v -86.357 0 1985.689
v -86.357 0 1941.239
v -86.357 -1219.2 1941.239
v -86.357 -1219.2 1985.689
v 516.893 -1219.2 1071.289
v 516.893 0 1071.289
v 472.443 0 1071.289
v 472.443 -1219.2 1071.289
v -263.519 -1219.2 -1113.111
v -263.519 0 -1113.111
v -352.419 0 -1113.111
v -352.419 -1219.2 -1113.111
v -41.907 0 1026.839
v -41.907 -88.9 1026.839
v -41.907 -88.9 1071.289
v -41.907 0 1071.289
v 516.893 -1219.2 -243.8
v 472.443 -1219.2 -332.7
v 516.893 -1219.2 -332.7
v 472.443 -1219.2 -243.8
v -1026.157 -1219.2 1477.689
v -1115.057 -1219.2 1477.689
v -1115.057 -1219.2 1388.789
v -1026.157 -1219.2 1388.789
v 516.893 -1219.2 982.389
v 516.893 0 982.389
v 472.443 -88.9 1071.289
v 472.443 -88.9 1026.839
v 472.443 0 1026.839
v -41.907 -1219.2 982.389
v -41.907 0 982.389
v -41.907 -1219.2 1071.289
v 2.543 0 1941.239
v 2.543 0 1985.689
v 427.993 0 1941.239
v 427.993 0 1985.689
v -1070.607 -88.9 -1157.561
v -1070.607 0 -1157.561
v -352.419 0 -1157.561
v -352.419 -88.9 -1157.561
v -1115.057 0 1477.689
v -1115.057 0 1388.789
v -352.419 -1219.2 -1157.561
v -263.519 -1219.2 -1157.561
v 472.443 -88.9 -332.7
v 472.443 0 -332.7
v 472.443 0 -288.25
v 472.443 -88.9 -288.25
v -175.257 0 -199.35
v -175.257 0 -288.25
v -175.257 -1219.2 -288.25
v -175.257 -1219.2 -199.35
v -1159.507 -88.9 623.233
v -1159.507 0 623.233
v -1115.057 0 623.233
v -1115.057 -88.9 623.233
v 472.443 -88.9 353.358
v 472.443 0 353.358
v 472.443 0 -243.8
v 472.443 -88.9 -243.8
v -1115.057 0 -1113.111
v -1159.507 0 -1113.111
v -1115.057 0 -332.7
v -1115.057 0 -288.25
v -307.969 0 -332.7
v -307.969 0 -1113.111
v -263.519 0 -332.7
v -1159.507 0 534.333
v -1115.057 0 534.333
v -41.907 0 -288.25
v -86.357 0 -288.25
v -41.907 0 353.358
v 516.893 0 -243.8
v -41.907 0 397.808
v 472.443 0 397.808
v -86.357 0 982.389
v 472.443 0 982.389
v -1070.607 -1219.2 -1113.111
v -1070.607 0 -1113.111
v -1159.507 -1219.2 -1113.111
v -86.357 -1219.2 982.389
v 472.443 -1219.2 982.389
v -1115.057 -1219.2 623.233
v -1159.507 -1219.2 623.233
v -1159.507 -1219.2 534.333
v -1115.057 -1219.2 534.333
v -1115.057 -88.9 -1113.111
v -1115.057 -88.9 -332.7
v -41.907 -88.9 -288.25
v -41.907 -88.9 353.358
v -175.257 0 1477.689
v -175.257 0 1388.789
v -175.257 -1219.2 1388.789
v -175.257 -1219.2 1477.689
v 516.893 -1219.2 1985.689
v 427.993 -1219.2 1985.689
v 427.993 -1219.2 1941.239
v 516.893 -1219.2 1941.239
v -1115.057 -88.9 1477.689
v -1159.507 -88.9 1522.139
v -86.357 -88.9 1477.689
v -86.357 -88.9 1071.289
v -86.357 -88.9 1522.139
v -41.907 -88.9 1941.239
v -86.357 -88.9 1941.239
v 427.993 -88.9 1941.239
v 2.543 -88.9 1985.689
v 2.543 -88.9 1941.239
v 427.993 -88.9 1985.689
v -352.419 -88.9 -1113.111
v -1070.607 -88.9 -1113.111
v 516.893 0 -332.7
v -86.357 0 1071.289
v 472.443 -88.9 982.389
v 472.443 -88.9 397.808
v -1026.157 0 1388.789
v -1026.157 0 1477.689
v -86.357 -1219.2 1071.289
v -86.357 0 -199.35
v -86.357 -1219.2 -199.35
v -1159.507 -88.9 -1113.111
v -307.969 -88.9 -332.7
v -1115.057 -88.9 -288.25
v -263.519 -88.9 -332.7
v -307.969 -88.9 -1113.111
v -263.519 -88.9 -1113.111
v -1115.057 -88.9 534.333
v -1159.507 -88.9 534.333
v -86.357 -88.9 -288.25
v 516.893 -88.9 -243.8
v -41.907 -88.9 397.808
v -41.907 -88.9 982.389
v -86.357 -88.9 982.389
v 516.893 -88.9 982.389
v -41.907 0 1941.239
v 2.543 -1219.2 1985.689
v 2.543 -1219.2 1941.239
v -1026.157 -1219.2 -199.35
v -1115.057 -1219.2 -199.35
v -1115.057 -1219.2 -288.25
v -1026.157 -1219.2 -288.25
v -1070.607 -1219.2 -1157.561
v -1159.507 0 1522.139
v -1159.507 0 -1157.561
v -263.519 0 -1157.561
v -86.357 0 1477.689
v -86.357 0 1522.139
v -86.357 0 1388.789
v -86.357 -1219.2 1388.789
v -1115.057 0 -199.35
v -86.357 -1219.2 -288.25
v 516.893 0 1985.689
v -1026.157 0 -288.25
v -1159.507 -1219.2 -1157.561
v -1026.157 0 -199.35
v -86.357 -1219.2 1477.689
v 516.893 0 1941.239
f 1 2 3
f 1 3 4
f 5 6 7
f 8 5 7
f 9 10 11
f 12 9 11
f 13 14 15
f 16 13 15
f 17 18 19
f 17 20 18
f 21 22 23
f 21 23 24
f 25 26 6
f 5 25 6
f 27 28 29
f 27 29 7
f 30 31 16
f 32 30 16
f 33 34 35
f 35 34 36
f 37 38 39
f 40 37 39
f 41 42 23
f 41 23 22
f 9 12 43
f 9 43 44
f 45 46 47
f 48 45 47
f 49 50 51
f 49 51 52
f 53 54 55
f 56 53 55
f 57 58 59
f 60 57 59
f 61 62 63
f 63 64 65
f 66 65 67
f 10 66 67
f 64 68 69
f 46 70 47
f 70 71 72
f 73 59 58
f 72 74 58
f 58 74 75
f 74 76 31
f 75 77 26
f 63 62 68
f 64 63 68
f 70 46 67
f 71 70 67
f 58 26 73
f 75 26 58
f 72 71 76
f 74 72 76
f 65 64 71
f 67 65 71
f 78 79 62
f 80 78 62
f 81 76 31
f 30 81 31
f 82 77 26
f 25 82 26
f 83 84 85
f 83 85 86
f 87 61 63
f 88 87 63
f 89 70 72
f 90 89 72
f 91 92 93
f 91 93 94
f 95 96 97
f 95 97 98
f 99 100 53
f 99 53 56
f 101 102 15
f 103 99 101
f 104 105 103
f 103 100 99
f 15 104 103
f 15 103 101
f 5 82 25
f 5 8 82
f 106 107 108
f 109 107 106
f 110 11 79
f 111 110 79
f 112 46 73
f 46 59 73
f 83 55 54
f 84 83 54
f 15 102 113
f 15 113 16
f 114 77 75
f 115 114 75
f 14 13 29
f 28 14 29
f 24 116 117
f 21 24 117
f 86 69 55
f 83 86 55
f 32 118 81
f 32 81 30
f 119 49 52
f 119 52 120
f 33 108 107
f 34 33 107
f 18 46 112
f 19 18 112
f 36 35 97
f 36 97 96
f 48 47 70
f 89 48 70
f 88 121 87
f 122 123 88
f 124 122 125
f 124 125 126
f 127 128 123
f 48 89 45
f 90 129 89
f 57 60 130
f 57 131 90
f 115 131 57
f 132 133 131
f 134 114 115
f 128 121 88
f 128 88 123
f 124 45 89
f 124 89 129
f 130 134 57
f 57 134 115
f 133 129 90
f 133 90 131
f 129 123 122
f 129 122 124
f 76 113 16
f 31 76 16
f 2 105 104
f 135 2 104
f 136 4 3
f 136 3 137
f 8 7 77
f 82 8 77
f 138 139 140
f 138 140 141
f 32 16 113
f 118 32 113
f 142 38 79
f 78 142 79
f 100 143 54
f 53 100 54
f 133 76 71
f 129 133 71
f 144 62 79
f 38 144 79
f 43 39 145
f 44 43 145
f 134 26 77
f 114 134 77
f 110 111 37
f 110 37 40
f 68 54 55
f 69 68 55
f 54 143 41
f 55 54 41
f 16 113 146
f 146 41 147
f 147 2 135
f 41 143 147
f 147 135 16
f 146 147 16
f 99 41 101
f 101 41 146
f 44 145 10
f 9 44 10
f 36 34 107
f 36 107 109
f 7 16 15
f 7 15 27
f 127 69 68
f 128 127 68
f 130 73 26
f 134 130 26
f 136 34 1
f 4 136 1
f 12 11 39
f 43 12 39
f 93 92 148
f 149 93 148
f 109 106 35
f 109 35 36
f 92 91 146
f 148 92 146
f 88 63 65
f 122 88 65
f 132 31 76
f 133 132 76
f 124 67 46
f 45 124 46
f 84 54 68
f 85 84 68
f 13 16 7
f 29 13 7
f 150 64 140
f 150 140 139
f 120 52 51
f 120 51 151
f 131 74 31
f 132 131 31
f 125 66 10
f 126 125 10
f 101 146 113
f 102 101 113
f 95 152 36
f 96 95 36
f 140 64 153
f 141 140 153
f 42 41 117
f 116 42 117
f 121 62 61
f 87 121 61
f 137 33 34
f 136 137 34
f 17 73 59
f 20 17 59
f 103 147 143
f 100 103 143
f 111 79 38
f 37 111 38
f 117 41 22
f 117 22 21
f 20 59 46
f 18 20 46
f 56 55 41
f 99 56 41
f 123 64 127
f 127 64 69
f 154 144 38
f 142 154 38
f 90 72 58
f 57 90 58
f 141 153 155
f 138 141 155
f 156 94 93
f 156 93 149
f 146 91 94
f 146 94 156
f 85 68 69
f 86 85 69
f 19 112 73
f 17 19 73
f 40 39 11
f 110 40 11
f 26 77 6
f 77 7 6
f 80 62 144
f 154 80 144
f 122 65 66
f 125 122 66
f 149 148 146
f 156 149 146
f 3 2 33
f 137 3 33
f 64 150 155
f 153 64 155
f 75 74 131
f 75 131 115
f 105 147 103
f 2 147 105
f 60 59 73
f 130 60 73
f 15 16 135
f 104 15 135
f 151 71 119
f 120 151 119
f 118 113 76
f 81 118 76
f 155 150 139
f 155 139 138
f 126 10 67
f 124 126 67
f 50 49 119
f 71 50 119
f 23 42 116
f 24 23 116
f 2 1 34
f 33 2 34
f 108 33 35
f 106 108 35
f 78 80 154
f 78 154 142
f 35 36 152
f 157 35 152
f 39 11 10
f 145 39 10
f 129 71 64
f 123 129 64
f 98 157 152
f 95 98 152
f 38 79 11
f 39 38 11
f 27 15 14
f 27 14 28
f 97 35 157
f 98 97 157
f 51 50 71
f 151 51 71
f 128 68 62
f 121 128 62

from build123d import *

# Parameters (mm, degrees)
F0_W     = 44.45
F0_H     = 419.1
F0_W_2   = 425.45
F0_H_2   = 44.45
F0_H_3   = 780.411793
F0_W_3   = 514.35
F1_DEPTH = 88.9
F0_W_4   = 88.9
F0_H_4   = 88.9
F2_DEPTH = 1219.2


with BuildPart() as f1:
    # F0 (on Front) → F1 (new body)
    with BuildSketch(Plane.XZ):
        with Locations((-64.132171, 1731.688611)):
            Rectangle(F0_W, F0_H)
        with Locations((215.267829, 1963.463611)):
            Rectangle(F0_W_2, F0_H_2)
        Polygon((-1159.507171, 1522.138611), (-1159.507171, 1477.688611), (-1115.057171, 1477.688611), (-1026.157171, 1477.688611), (-622.932171, 1477.688611), (-578.482171, 1477.688611), (-175.257171, 1477.688611), (-86.357171, 1477.688611), (-86.357171, 1522.138611), align=None)
        Polygon((-1159.507171, 1477.688611), (-1159.507171, 623.232611), (-1115.057171, 623.232611), (-1115.057171, 1388.788611), (-1115.057171, 1477.688611), align=None)
        Polygon((-1159.507171, 534.332611), (-1159.507171, -1113.111389), (-1115.057171, -1113.111389), (-1115.057171, -332.699596), (-1115.057171, -288.249596), (-1115.057171, -199.349596), (-1115.057171, 534.332611), align=None)
        Polygon((-1070.607171, -1113.111389), (-1070.607171, -1157.561389), (-352.418964, -1157.561389), (-352.418964, -1113.111389), (-689.607171, -1113.111389), (-734.057171, -1113.111389), align=None)
        with Locations((-285.743964, -722.905492)):
            Rectangle(F0_W, F0_H_3)
        Polygon((-263.518964, -332.699596), (472.442829, -332.699596), (472.442829, -288.249596), (-41.907171, -288.249596), (-86.357171, -288.249596), (-175.257171, -288.249596), (-307.968964, -288.249596), (-307.968964, -332.699596), align=None)
        Polygon((-1115.057171, -288.249596), (-1115.057171, -332.699596), (-734.057171, -332.699596), (-689.607171, -332.699596), (-307.968964, -332.699596), (-307.968964, -288.249596), (-578.482171, -288.249596), (-622.932171, -288.249596), (-1026.157171, -288.249596), align=None)
        Polygon((-86.357171, -288.249596), (-41.907171, -288.249596), (-41.907171, 353.357611), (-41.907171, 397.807611), (-41.907171, 982.388611), (-86.357171, 982.388611), (-86.357171, 623.232611), (-86.357171, 578.782611), (-86.357171, -199.349596), align=None)
        Polygon((472.442829, -243.799596), (516.892829, -243.799596), (516.892829, 982.388611), (472.442829, 982.388611), (472.442829, 397.807611), (472.442829, 353.357611), align=None)
        with Locations((215.267829, 1049.063611)):
            Rectangle(F0_W_3, F0_H_2)
        with Locations((215.267829, 375.582611)):
            Rectangle(F0_W_3, F0_H_2)
        Polygon((-41.907171, 1522.138611), (-86.357171, 1522.138611), (-86.357171, 1477.688611), (-86.357171, 1388.788611), (-86.357171, 1071.288611), (-41.907171, 1071.288611), (-41.907171, 1477.688611), align=None)
    extrude(amount=F1_DEPTH)


with BuildPart() as f2:
    # F0 (on Front) → F2 (new body)
    with BuildSketch(Plane.XZ):
        with Locations((-1070.607171, 1433.238611)):
            Rectangle(F0_W_4, F0_H_4)
        with Locations((-130.807171, 1433.238611)):
            Rectangle(F0_W_4, F0_H_4)
        Polygon((-41.907171, 1071.288611), (-86.357171, 1071.288611), (-86.357171, 982.388611), (-41.907171, 982.388611), (-41.907171, 1026.838611), align=None)
        Polygon((-1159.507171, 623.232611), (-1159.507171, 534.332611), (-1115.057171, 534.332611), (-1115.057171, 578.782611), (-1115.057171, 623.232611), align=None)
        with Locations((-64.132171, 1963.463611)):
            Rectangle(F0_W, F0_H_2)
        with Locations((-19.682171, 1963.463611)):
            Rectangle(F0_W, F0_H_2)
        with Locations((450.217829, 1963.463611)):
            Rectangle(F0_W, F0_H_2)
        with Locations((494.667829, 1963.463611)):
            Rectangle(F0_W, F0_H_2)
        Polygon((472.442829, 982.388611), (516.892829, 982.388611), (516.892829, 1071.288611), (472.442829, 1071.288611), (472.442829, 1026.838611), align=None)
        with Locations((-130.807171, -243.799596)):
            Rectangle(F0_W_4, F0_H_4)
        with Locations((-1070.607171, -243.799596)):
            Rectangle(F0_W_4, F0_H_4)
        Polygon((472.442829, -288.249596), (472.442829, -332.699596), (516.892829, -332.699596), (516.892829, -243.799596), (472.442829, -243.799596), align=None)
        Polygon((-352.418964, -1113.111389), (-352.418964, -1157.561389), (-263.518964, -1157.561389), (-263.518964, -1113.111389), (-307.968964, -1113.111389), align=None)
        Polygon((-1159.507171, -1113.111389), (-1159.507171, -1157.561389), (-1070.607171, -1157.561389), (-1070.607171, -1113.111389), (-1115.057171, -1113.111389), align=None)
    extrude(amount=F2_DEPTH)


solid = Compound([f1.part, f2.part])
